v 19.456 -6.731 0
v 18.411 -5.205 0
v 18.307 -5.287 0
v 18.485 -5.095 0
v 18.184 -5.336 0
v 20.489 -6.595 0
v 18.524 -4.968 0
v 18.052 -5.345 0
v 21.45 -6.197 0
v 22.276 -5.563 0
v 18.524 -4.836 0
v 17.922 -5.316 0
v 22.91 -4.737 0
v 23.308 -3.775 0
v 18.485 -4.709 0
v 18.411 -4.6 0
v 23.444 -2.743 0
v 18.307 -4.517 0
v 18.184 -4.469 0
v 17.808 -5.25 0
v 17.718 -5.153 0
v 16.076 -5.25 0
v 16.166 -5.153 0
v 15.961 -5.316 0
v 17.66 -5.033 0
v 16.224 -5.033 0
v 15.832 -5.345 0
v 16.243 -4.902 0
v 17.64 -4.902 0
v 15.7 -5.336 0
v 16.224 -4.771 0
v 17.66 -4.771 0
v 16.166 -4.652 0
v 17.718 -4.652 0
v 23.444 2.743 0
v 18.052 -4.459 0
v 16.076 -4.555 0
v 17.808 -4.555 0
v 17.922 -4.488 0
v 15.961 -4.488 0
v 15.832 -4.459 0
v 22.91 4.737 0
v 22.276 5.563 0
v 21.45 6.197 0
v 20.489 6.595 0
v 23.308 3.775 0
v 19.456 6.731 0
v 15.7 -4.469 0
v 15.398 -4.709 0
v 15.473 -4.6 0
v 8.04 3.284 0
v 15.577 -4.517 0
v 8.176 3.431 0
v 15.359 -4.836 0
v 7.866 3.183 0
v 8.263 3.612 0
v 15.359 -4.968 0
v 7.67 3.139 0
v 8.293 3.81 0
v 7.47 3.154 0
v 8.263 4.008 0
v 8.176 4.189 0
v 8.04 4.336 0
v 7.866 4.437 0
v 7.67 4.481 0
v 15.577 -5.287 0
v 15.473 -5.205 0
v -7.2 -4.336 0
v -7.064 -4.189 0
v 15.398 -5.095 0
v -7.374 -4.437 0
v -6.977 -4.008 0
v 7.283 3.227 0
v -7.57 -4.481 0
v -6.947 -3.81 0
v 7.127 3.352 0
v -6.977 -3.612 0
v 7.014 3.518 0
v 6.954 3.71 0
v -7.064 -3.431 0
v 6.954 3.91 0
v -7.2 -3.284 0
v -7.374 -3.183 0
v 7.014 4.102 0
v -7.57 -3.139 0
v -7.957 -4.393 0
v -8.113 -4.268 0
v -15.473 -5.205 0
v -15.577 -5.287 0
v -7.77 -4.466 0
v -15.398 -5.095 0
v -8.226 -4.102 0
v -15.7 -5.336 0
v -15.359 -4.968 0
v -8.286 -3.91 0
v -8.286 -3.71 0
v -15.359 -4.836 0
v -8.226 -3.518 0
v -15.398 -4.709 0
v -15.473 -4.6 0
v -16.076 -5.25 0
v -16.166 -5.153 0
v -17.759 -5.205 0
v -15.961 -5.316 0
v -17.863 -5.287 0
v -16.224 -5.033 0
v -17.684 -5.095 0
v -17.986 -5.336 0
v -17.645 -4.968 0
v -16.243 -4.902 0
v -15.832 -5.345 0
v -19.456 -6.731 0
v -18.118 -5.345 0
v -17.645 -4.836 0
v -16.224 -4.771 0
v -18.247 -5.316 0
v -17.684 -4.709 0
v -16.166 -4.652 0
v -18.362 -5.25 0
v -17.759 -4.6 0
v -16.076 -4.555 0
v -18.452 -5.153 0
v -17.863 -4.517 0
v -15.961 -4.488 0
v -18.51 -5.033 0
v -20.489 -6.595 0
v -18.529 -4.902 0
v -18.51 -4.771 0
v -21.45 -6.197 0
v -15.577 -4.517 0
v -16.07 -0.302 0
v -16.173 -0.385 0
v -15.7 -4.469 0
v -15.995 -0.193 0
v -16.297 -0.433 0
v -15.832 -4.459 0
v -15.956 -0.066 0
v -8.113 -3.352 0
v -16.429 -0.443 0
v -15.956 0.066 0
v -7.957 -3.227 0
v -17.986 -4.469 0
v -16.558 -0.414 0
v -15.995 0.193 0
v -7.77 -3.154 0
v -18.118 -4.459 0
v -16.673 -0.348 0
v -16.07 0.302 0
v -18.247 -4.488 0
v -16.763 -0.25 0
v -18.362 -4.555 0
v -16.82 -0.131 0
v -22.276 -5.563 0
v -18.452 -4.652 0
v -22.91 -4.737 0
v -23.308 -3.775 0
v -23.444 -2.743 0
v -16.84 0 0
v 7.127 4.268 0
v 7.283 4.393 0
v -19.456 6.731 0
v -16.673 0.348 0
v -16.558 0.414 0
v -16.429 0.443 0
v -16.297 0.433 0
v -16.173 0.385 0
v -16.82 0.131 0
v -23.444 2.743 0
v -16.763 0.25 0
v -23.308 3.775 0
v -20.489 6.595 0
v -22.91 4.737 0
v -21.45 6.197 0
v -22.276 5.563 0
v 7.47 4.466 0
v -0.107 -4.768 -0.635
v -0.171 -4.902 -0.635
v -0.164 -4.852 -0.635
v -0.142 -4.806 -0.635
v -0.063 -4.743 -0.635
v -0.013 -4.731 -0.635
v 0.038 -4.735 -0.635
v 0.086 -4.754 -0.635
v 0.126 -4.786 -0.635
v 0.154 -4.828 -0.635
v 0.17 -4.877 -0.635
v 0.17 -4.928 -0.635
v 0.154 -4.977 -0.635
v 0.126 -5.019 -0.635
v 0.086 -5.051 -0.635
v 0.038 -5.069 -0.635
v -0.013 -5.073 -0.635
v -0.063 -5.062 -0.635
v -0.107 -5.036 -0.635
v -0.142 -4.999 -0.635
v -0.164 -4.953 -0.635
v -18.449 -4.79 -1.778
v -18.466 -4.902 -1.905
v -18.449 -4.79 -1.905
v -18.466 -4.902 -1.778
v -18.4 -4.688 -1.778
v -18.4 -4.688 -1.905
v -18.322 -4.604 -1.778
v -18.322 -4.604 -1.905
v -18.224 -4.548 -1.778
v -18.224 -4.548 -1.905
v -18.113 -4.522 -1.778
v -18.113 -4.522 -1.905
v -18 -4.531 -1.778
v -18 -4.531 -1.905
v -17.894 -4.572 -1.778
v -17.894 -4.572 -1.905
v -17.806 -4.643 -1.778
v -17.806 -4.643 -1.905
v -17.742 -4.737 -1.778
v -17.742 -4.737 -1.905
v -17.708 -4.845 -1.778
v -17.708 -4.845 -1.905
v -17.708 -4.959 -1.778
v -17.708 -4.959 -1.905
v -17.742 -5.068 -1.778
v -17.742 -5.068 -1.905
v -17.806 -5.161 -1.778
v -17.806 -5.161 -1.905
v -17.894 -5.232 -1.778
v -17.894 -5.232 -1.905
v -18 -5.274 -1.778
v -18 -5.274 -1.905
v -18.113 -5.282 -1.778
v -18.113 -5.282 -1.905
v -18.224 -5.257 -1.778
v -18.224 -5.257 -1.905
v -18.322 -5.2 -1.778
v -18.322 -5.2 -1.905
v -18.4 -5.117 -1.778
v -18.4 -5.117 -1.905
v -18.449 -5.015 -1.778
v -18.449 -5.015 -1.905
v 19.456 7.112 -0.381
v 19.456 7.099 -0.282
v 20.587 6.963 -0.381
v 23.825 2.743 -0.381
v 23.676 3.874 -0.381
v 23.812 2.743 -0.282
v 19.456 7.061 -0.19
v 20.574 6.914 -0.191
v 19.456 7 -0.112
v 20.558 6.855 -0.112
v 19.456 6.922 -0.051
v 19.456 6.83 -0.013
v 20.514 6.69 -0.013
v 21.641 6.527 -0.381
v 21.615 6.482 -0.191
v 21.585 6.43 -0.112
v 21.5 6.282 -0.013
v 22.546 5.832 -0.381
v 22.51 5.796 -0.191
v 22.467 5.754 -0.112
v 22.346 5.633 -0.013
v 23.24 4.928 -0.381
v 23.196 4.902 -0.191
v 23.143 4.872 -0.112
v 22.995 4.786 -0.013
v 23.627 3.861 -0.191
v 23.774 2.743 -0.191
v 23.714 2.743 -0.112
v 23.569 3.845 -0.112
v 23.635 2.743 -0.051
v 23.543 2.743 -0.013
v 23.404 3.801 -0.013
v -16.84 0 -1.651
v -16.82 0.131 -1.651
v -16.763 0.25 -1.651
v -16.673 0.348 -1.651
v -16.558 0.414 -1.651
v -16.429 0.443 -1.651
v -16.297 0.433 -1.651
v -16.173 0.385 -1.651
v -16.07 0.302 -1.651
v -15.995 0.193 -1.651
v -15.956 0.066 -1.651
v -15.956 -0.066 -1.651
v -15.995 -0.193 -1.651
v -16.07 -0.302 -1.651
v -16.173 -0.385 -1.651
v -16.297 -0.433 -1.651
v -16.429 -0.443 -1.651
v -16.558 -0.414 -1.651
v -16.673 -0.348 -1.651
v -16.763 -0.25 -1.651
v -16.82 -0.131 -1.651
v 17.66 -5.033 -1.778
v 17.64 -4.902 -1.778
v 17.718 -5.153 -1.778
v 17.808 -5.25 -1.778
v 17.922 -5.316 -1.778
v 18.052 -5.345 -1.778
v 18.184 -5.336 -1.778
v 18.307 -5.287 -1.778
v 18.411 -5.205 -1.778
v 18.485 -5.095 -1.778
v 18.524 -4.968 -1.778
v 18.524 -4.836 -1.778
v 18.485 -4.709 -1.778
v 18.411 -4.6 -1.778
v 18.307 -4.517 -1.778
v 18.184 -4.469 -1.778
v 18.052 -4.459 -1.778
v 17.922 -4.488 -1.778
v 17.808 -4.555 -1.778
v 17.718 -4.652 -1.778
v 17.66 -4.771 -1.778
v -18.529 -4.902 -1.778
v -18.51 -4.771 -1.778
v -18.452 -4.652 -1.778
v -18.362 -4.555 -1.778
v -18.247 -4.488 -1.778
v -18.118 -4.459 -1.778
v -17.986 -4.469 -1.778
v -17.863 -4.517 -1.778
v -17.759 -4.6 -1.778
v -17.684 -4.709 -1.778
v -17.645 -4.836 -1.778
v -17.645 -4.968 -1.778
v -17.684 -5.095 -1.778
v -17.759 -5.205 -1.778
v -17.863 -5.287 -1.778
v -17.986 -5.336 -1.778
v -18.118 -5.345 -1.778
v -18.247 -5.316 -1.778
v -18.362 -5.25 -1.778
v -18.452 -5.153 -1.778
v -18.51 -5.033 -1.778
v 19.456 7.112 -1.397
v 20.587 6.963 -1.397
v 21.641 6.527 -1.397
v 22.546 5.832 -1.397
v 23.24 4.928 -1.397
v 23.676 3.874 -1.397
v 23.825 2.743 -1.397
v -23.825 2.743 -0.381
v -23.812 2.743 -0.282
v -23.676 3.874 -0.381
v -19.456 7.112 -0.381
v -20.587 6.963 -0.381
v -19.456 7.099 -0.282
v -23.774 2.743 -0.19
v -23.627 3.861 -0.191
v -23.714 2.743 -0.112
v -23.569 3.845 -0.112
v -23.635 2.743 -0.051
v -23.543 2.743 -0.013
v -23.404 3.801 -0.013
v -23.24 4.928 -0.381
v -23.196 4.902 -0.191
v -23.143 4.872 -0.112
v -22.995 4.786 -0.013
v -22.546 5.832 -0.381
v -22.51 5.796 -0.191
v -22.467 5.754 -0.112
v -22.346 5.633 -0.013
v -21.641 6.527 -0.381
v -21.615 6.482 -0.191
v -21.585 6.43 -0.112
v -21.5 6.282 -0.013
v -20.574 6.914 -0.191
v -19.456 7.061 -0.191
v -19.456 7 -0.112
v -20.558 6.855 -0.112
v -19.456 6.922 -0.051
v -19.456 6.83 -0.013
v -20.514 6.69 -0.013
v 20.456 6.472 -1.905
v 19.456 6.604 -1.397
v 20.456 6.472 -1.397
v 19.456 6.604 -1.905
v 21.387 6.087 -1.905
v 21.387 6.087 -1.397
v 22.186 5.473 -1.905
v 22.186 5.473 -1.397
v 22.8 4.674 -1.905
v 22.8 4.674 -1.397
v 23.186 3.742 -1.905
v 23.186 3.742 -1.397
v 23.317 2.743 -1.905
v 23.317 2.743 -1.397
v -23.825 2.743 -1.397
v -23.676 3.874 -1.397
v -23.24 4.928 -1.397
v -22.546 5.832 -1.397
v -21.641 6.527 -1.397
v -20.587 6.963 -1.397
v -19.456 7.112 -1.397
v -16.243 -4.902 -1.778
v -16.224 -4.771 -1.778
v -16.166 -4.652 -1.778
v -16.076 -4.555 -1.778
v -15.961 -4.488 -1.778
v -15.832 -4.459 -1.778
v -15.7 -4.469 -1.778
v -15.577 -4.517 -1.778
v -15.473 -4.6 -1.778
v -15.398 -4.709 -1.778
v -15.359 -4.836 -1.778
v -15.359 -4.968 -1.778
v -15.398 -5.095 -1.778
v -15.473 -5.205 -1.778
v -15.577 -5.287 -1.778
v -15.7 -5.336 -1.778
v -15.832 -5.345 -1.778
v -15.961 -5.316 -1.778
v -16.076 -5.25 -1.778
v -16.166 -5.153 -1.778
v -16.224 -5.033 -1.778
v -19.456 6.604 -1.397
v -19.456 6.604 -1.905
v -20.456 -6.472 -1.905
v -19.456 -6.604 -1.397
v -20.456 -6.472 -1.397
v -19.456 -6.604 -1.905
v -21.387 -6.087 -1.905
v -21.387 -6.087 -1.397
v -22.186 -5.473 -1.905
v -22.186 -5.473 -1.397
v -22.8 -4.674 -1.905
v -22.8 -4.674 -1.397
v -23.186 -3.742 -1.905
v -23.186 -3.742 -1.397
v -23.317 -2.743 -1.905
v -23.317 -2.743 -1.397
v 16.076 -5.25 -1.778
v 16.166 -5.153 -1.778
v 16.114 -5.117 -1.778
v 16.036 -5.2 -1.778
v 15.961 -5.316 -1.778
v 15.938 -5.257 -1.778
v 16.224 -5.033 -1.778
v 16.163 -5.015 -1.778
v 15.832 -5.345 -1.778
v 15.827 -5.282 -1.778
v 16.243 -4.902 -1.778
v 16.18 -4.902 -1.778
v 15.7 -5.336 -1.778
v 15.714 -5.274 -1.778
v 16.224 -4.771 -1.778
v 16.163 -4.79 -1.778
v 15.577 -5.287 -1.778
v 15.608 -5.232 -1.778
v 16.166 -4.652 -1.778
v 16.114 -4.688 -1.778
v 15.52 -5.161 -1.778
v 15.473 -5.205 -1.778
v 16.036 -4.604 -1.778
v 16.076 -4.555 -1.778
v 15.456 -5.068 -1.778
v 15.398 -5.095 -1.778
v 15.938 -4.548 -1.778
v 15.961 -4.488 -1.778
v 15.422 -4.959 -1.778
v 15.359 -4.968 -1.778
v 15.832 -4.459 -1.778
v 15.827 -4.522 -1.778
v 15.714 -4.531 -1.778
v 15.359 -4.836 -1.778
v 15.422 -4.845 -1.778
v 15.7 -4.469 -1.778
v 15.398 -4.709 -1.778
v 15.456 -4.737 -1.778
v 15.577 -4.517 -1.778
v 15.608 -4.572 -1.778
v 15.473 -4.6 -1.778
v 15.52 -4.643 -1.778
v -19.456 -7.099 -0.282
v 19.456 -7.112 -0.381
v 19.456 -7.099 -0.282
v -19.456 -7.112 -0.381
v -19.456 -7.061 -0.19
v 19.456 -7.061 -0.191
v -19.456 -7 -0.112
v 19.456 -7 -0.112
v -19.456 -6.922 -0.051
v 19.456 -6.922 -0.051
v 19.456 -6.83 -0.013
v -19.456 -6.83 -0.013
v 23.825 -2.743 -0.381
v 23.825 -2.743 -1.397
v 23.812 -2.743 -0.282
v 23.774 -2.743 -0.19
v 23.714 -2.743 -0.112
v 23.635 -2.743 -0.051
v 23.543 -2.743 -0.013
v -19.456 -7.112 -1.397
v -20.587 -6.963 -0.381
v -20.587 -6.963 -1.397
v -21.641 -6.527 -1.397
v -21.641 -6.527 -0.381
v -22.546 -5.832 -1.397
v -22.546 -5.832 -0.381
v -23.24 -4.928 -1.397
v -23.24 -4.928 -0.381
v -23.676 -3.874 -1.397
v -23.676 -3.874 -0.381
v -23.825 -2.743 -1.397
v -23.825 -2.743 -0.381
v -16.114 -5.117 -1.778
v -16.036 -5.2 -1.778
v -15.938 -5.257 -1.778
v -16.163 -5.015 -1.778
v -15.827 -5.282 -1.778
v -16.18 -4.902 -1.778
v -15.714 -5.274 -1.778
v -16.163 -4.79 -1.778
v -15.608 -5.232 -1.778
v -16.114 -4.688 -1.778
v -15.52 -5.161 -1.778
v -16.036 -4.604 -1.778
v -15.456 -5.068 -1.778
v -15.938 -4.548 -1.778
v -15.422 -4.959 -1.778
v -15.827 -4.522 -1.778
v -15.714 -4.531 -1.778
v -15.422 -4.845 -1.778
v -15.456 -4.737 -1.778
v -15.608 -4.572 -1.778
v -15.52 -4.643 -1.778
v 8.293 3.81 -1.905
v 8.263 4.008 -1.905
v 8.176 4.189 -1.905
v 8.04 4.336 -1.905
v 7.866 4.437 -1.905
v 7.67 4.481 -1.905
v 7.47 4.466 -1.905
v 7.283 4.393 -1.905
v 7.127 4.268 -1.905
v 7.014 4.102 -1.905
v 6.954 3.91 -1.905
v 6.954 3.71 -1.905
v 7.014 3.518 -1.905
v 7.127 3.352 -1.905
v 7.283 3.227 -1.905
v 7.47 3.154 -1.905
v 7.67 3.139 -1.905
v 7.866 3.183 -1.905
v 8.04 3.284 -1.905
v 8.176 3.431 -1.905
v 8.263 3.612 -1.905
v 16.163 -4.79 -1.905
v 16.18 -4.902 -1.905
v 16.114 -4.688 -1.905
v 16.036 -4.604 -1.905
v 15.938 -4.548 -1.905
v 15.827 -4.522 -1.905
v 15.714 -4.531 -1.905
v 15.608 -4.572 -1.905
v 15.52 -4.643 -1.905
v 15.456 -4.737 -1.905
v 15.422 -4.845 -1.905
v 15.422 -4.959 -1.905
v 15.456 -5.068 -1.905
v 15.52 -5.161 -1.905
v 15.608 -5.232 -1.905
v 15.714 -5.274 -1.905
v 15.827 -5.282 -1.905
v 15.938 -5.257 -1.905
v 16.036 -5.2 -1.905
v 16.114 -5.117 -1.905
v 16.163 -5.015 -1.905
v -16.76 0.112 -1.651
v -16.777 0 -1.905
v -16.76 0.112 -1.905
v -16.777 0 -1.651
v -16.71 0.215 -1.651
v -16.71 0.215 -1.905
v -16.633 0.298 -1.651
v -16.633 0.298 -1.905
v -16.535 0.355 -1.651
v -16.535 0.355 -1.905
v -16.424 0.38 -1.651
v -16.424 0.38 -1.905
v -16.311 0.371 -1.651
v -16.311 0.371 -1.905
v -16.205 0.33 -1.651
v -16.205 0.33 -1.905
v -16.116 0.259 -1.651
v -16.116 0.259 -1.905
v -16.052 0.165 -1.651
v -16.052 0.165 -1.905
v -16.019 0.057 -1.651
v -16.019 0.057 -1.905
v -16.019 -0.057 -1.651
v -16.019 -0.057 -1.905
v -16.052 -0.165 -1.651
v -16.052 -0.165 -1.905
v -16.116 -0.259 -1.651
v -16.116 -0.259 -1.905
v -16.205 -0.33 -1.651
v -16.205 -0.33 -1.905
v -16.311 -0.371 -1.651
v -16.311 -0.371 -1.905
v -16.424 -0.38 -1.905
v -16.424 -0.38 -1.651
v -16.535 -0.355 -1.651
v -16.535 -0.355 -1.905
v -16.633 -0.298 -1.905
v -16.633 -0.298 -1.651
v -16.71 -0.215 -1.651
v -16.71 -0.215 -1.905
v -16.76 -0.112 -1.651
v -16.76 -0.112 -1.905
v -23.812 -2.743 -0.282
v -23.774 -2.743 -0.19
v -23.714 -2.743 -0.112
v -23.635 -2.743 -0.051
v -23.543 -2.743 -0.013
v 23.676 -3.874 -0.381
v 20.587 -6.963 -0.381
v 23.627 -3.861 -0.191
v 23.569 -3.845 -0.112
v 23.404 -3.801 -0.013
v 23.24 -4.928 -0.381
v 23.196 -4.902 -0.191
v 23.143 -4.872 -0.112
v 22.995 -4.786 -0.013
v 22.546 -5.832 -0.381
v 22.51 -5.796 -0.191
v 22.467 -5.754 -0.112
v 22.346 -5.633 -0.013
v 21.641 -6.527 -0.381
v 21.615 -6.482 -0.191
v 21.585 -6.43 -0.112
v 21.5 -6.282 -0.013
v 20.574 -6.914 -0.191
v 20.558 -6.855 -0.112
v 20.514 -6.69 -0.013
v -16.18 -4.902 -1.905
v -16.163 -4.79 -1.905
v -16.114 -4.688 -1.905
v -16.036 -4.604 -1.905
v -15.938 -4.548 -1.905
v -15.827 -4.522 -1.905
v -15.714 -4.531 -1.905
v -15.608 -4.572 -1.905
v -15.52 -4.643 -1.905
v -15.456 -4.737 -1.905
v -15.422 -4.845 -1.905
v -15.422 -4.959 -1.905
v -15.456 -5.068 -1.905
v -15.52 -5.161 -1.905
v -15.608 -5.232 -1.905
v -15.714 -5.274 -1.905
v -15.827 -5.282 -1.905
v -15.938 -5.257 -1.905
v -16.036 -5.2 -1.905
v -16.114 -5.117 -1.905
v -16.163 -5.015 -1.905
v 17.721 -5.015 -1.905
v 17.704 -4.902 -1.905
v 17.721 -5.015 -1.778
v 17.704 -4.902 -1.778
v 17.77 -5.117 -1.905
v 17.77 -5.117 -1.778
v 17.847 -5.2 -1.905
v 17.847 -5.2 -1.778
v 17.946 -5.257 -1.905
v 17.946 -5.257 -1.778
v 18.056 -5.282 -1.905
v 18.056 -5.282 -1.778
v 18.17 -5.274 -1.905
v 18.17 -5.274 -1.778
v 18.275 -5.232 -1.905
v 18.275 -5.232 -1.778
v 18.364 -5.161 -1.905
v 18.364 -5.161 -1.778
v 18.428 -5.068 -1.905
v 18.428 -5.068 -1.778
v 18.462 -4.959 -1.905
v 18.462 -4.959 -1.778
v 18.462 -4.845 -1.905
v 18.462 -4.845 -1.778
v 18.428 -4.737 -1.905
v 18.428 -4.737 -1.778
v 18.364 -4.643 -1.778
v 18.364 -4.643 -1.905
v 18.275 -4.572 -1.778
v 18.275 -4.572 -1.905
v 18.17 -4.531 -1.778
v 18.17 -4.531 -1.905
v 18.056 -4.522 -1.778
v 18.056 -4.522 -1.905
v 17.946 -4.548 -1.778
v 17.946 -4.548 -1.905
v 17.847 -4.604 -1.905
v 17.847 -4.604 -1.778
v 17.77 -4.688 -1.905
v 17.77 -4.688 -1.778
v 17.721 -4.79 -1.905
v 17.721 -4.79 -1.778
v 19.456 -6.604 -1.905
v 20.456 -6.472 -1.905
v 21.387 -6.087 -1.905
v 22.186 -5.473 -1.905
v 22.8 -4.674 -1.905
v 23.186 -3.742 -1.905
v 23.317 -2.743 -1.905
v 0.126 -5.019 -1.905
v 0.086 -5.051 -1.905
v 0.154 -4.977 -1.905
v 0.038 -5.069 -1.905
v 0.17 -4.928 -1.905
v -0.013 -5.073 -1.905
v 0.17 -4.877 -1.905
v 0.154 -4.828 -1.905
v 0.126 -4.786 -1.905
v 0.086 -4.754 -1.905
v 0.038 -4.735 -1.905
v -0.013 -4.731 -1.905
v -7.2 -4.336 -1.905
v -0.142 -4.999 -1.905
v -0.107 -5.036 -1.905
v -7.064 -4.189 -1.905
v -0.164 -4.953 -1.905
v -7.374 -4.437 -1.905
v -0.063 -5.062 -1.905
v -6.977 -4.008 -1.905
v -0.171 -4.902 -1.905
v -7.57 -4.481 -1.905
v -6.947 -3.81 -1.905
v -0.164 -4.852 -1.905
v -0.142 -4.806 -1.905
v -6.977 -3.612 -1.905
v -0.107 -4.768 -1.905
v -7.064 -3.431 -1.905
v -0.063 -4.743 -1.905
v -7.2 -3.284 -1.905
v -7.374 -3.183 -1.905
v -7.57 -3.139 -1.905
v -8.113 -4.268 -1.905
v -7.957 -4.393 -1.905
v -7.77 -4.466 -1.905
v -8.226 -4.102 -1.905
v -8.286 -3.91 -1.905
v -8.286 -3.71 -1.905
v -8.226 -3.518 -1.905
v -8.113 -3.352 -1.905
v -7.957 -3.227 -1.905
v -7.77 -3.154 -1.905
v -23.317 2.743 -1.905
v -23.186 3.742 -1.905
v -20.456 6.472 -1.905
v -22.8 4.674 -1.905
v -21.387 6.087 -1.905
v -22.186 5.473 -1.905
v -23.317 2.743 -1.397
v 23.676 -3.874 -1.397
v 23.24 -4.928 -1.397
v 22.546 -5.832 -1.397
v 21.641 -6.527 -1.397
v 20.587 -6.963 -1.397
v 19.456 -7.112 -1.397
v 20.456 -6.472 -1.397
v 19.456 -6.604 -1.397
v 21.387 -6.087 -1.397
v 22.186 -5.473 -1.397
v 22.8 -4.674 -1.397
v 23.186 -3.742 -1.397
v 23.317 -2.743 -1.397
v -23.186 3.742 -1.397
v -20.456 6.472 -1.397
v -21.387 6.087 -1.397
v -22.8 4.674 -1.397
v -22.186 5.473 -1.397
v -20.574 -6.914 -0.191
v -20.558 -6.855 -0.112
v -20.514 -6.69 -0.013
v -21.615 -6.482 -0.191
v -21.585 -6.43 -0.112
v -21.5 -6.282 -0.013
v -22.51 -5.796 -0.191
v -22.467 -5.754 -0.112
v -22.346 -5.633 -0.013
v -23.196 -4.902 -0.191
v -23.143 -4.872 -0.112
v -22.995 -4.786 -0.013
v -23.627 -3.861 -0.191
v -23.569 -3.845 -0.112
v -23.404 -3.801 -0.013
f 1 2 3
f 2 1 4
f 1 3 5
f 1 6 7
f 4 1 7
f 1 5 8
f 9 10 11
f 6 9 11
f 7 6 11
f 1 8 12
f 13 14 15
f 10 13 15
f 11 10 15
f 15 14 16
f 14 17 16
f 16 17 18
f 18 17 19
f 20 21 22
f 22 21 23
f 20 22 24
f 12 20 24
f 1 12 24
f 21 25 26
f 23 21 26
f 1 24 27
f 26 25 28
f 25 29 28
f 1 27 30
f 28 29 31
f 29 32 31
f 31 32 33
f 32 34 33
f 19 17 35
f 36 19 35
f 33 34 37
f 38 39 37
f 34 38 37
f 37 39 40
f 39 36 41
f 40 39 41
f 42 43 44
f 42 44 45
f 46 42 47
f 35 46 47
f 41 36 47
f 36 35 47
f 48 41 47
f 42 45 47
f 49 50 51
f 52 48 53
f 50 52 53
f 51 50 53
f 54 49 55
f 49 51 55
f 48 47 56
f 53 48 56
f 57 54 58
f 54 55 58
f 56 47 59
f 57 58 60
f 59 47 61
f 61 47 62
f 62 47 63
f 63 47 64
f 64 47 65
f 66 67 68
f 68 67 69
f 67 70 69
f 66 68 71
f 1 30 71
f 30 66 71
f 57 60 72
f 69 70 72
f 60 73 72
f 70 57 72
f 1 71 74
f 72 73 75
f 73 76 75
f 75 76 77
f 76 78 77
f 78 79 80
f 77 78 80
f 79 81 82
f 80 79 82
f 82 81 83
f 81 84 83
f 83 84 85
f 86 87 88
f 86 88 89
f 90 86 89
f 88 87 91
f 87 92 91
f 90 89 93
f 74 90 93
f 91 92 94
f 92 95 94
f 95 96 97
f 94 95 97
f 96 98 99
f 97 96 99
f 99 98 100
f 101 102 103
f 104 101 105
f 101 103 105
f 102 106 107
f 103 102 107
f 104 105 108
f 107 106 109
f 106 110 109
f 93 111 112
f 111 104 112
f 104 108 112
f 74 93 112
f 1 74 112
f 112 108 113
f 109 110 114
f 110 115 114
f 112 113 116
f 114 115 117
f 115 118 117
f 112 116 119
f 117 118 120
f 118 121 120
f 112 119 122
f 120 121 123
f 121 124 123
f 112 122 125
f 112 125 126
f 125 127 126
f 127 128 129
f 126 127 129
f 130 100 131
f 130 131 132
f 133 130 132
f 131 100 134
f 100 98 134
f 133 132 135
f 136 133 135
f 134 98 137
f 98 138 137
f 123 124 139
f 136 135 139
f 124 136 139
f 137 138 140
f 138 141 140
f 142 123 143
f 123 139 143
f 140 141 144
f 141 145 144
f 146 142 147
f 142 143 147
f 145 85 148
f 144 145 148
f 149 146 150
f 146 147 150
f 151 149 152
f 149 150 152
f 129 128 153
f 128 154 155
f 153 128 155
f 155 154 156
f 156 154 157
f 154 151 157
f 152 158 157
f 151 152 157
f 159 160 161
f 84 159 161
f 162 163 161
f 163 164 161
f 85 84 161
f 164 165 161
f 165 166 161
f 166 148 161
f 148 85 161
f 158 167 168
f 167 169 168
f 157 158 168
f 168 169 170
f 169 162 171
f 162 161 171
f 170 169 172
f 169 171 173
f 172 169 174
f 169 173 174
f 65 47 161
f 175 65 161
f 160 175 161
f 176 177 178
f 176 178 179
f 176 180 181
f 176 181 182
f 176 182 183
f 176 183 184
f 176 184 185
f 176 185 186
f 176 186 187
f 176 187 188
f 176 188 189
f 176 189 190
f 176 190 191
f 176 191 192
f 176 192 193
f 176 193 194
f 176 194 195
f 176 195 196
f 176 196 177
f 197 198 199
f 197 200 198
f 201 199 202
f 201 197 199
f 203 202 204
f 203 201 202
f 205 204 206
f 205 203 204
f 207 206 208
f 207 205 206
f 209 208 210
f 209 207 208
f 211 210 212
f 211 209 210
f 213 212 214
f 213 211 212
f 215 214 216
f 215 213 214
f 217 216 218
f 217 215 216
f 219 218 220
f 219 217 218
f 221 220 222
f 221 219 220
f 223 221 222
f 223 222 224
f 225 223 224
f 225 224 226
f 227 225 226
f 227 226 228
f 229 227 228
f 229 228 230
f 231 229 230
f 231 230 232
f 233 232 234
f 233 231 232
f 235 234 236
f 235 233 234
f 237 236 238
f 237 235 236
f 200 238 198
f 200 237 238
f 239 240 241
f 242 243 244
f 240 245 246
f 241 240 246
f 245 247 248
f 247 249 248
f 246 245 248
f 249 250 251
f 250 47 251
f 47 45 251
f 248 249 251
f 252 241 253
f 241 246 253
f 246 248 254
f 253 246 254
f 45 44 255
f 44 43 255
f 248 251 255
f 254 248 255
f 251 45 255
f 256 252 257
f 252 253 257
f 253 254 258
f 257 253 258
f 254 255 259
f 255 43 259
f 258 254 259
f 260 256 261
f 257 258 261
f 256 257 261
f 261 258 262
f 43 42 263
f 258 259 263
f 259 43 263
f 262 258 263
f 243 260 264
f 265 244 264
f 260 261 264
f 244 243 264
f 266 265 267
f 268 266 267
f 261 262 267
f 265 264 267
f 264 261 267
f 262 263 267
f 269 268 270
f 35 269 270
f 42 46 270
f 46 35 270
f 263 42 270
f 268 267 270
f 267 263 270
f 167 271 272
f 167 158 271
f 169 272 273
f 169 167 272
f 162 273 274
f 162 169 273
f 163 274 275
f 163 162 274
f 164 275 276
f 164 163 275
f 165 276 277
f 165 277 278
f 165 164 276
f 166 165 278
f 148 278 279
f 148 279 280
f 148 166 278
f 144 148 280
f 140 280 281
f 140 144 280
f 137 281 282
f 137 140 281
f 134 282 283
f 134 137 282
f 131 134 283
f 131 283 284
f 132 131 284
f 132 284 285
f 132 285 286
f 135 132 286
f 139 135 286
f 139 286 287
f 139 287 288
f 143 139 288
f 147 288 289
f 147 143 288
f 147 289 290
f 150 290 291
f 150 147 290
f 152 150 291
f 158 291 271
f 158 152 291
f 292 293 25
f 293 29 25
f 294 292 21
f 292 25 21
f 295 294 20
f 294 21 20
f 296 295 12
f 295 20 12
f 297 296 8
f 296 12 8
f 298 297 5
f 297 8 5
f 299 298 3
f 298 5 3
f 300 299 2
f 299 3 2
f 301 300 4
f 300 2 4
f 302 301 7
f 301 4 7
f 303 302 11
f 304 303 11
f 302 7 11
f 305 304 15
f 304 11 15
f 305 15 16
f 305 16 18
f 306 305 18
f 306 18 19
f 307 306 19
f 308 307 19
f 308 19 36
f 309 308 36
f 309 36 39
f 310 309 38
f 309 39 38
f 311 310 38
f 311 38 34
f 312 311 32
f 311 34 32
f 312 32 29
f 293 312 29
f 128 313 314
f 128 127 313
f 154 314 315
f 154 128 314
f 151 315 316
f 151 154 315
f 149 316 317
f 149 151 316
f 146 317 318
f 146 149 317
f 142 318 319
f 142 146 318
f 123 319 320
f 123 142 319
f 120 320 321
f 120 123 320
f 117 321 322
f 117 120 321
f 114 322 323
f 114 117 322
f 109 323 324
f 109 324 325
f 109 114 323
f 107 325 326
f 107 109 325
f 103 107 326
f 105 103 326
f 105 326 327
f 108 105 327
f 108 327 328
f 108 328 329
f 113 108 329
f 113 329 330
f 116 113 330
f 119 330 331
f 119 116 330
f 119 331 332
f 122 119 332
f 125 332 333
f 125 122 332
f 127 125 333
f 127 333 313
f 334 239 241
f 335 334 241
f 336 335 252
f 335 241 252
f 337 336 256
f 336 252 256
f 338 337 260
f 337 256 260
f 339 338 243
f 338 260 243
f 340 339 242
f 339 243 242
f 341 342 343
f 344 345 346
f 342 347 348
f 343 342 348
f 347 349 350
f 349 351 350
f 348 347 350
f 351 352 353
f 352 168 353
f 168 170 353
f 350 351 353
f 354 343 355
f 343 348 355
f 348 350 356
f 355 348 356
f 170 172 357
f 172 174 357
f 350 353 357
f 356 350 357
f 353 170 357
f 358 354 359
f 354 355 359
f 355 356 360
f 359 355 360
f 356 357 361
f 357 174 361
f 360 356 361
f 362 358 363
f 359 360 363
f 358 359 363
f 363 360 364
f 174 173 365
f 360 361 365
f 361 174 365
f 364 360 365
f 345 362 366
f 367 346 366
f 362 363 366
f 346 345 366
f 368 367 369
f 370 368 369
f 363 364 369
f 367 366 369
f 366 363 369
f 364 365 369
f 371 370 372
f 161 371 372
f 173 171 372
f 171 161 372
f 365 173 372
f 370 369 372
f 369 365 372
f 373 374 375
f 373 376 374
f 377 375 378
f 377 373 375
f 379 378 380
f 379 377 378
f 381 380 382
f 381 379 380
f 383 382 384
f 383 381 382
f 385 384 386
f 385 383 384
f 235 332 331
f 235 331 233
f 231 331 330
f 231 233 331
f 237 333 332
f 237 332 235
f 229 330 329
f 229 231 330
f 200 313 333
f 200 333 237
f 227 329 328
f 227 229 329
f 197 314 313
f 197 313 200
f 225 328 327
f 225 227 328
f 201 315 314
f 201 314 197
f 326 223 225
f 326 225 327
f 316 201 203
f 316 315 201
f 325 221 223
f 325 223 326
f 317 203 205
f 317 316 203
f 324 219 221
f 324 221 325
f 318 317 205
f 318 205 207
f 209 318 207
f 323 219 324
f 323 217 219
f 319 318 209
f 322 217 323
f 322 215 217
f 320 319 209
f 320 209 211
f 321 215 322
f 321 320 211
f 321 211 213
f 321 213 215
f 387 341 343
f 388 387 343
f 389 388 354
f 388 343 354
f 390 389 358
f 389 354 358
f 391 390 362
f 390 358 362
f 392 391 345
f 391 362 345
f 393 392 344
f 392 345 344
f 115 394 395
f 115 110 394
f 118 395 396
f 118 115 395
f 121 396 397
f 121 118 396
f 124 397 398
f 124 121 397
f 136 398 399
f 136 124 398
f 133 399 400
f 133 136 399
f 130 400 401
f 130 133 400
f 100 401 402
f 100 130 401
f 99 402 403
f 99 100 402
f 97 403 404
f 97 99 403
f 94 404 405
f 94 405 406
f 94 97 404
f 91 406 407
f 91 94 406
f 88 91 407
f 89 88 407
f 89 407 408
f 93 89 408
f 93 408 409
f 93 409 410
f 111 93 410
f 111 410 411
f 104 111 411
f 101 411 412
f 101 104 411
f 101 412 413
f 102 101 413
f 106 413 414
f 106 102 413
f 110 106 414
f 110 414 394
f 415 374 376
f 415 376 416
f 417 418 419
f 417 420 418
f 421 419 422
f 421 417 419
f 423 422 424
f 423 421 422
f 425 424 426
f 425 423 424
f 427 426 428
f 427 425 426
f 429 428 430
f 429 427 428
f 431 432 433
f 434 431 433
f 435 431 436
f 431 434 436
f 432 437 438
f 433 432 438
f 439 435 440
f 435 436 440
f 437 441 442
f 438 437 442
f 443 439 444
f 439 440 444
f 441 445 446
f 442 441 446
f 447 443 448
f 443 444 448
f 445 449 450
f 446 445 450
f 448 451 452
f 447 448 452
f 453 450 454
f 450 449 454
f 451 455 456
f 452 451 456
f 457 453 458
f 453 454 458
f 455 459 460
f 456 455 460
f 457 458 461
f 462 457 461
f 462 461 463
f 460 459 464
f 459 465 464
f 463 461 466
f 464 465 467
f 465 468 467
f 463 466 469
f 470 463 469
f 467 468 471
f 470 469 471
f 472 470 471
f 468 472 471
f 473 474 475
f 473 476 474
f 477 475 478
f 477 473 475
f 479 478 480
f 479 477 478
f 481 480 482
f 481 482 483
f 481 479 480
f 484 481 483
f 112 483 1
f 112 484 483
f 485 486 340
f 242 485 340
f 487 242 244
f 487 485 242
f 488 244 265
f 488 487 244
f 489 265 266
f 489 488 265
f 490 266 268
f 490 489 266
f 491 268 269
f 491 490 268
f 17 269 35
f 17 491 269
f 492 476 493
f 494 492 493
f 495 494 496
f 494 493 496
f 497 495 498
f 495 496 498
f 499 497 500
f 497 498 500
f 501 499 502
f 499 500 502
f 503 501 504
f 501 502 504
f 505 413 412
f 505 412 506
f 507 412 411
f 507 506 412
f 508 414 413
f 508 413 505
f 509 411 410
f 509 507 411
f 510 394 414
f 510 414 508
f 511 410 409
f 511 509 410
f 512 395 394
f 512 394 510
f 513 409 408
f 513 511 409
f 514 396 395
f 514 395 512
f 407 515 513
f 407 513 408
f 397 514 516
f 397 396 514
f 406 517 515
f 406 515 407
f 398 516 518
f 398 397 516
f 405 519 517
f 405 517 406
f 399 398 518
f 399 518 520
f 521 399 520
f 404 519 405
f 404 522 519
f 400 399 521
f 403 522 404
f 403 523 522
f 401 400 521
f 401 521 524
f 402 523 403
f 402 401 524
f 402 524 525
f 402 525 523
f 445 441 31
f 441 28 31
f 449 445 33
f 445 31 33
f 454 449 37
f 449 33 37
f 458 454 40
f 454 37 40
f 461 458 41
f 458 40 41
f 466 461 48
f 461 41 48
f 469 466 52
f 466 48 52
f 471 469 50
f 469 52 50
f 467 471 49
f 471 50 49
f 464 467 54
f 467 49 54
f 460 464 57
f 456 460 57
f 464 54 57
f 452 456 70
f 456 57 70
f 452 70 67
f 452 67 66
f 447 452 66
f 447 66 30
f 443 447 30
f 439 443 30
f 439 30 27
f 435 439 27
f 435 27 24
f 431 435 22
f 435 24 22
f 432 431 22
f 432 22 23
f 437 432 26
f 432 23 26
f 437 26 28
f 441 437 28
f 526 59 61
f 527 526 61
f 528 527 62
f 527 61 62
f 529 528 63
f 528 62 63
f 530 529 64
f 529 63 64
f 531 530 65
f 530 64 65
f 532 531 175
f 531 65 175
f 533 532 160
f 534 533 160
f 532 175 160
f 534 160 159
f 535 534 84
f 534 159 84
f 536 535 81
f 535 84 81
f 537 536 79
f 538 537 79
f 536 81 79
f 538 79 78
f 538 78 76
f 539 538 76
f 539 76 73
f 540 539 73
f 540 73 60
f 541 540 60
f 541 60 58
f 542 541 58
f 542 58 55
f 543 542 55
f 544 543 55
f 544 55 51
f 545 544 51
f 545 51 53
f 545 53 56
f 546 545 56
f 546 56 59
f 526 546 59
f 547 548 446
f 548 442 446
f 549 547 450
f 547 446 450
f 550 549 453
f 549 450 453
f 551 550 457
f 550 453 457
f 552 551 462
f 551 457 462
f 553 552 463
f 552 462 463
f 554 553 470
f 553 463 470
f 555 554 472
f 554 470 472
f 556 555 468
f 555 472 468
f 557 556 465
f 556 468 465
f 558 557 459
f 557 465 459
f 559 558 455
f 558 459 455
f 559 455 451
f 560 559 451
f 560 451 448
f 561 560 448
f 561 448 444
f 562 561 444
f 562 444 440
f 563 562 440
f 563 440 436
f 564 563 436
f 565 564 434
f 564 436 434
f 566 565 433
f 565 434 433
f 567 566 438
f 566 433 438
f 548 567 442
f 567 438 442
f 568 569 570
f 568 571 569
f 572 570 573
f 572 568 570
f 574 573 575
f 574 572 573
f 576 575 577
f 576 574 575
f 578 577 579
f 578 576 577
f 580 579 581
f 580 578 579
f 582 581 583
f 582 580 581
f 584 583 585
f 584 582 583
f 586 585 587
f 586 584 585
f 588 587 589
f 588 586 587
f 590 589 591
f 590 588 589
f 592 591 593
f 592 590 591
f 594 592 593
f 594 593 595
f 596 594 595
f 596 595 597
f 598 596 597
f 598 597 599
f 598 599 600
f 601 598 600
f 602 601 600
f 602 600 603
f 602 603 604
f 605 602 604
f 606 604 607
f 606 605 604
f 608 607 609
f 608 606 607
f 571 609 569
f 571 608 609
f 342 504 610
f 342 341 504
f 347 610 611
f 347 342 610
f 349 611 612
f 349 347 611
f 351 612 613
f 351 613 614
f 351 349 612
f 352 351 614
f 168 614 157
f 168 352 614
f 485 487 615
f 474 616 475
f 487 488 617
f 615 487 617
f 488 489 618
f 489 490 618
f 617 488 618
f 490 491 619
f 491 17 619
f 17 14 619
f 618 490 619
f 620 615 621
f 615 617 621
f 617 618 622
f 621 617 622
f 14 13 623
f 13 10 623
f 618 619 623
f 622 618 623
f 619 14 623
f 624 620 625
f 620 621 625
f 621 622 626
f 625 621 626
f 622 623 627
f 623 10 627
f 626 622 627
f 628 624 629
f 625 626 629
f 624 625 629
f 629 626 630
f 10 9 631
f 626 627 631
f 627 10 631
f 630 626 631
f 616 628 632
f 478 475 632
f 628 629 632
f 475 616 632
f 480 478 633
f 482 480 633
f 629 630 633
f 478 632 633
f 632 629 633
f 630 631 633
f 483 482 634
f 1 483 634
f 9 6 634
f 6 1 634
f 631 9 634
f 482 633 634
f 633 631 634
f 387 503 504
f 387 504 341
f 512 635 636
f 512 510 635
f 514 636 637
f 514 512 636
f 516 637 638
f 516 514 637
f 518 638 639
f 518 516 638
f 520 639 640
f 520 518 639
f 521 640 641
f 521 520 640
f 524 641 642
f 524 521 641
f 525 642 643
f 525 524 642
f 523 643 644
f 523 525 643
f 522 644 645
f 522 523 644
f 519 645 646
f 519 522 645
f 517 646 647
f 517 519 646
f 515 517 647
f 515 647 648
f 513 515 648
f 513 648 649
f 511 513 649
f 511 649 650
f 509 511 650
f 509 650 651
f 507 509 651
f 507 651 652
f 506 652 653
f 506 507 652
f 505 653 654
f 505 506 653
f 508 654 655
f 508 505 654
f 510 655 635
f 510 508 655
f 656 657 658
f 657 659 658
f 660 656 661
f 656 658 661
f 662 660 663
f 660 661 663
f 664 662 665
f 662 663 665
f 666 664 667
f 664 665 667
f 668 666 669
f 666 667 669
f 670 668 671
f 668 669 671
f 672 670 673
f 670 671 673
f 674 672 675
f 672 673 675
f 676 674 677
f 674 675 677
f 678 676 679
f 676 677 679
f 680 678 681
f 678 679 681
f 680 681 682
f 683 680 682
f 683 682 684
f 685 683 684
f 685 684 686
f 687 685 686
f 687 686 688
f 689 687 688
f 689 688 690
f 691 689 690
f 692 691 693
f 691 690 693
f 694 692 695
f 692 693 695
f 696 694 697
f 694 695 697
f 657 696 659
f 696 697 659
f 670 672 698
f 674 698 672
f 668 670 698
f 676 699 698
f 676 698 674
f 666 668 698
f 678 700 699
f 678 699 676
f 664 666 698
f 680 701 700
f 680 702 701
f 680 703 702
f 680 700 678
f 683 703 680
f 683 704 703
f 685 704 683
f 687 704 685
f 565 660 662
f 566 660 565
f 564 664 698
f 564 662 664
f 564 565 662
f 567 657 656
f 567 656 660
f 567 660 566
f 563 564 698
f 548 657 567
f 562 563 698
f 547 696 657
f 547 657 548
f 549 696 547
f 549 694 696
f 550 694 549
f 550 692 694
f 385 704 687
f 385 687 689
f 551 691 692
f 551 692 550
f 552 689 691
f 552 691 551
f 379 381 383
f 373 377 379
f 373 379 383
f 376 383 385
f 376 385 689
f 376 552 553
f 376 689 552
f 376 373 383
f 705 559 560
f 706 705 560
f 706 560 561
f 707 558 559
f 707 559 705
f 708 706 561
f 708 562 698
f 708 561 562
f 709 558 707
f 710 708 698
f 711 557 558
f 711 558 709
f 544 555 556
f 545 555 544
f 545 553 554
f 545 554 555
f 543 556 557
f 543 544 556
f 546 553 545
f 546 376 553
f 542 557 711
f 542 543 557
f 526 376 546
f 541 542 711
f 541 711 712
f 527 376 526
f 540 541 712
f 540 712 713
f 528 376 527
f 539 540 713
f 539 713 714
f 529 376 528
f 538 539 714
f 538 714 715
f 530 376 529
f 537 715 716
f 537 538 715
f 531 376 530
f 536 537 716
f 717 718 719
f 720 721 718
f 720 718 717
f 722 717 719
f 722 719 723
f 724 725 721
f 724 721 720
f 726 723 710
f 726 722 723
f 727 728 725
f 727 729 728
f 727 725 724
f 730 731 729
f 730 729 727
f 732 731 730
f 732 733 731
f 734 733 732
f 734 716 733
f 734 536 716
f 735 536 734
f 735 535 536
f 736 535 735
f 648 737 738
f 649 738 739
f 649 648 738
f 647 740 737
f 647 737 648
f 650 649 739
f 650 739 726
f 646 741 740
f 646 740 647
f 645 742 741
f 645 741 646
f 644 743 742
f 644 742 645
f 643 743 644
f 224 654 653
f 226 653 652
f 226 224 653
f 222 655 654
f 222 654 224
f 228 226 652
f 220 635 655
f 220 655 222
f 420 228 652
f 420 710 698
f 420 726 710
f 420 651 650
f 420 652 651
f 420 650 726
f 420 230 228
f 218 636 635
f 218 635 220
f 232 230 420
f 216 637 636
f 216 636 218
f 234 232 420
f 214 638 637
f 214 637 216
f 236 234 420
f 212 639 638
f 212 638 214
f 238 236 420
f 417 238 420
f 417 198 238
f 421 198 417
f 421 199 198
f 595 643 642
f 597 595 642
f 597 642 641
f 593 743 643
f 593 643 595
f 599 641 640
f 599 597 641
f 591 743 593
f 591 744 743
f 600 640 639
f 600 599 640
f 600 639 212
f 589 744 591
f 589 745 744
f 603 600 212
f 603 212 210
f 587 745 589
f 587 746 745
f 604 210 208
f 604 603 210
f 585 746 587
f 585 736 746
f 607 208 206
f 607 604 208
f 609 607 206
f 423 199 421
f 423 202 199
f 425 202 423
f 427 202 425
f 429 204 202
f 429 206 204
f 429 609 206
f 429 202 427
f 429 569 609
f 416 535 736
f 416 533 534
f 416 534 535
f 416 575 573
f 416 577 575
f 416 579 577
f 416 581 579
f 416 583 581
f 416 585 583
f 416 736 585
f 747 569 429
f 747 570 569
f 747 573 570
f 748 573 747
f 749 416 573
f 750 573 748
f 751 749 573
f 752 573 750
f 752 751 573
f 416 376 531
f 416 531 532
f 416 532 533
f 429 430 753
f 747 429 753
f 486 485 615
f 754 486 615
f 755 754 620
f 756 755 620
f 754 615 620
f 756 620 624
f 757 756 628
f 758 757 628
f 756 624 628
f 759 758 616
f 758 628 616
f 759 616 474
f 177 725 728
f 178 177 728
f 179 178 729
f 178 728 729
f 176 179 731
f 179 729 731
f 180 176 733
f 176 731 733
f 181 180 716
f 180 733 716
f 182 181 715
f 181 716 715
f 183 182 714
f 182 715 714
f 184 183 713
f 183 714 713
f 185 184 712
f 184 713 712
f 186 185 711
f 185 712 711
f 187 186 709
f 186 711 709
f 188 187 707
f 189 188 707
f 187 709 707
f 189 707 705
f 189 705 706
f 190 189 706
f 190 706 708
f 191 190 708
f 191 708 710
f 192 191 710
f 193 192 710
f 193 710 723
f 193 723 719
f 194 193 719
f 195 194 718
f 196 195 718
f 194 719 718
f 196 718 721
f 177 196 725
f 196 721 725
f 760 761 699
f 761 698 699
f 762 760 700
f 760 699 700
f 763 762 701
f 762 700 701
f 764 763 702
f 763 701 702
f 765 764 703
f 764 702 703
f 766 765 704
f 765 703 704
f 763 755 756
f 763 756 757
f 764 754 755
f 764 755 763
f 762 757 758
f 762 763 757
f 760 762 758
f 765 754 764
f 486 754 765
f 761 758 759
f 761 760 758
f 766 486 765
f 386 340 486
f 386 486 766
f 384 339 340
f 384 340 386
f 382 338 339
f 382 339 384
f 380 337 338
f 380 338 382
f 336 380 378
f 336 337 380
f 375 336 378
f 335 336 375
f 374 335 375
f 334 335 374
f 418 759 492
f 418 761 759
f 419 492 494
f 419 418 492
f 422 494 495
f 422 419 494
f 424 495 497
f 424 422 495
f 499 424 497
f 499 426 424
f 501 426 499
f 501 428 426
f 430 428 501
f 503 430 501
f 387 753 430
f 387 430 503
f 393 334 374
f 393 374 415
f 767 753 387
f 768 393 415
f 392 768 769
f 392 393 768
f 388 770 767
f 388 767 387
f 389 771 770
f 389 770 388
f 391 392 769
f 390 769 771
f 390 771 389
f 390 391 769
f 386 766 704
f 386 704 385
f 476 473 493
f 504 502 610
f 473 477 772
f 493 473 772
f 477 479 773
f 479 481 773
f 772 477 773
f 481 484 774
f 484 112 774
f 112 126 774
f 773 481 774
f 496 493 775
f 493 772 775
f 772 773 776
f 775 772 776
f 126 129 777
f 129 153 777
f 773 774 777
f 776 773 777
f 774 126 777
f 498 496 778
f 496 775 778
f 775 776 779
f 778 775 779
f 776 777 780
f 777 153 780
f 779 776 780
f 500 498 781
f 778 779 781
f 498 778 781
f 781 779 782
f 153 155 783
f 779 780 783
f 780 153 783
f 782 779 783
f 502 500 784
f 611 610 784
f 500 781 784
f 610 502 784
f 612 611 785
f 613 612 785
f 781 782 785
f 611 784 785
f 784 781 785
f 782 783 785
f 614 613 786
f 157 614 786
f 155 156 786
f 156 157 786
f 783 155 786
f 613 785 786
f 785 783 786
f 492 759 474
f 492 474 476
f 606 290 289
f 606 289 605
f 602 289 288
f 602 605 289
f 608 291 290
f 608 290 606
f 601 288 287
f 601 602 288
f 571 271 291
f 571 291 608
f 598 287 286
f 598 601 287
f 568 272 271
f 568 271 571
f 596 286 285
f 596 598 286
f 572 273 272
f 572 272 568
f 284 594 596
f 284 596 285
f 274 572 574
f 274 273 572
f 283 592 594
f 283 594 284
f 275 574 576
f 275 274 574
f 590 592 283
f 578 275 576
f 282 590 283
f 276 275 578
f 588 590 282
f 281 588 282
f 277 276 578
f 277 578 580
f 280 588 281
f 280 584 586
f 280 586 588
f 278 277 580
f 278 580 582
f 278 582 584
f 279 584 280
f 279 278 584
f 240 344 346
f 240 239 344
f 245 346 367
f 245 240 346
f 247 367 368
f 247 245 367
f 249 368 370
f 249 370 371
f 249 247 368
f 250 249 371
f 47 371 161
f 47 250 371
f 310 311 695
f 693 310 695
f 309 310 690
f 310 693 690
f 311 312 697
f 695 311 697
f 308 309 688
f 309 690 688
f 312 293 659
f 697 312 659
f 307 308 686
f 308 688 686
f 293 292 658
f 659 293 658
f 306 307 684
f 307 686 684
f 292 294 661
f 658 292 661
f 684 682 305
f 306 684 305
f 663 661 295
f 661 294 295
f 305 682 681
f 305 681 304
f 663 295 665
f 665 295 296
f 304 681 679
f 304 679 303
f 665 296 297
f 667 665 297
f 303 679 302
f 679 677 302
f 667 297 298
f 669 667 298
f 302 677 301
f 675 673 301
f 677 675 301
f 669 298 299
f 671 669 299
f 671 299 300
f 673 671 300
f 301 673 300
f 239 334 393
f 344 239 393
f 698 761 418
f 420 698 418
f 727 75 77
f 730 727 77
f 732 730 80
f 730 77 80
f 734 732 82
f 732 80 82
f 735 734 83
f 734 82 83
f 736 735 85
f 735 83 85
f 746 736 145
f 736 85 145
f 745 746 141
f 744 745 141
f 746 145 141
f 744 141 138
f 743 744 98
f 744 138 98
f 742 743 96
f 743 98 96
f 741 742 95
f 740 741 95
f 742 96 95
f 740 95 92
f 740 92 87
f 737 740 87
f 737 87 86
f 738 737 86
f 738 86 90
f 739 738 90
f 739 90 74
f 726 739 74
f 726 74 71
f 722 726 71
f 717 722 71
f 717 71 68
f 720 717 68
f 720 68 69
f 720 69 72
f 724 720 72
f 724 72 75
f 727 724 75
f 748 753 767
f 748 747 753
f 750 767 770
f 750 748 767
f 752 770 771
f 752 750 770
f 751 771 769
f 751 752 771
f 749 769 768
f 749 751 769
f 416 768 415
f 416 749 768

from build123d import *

# Parameters (mm, degrees)
SKETCH1_W           = 47.6504
SKETCH1_H           = 14.224
BOSS_EXTRUDE1_DEPTH = 1.397
SKETCH2_W           = 46.6344
SKETCH2_H           = 13.208
BOSS_EXTRUDE2_DEPTH = 0.508
FILLET1_R           = 3.8608
FILLET2_R           = 3.8608
FILLET3_R           = 3.8608
FILLET4_R           = 3.8608
FILLET5_R           = 4.3688
FILLET6_R           = 4.3688
FILLET7_R           = 4.3688
FILLET8_R           = 4.3688
FILLET9_R           = 0.381
LPATTERN1_COUNT     = 2
LPATTERN1_PITCH     = 2.286
SKETCH7_R           = 0.6731
CUT_EXTRUDE1_DEPTH  = 25.936914886
SKETCH8_R           = 0.17145
CUT_EXTRUDE2_DEPTH  = 1.27


with BuildPart() as part:
    # Sketch1 → Boss-Extrude1 (new body)
    with BuildSketch(Plane(origin=(0, 0, -1.397), x_dir=(-1, 0, 0), z_dir=(0, 0, -1))):
        Rectangle(SKETCH1_W, SKETCH1_H)
    extrude(amount=-BOSS_EXTRUDE1_DEPTH)

    # Sketch2 → Boss-Extrude2 (add)
    with BuildSketch(Plane(origin=(0, 0, -1.397), x_dir=(-1, 0, 0), z_dir=(0, 0, -1))):
        Rectangle(SKETCH2_W, SKETCH2_H)
    extrude(amount=BOSS_EXTRUDE2_DEPTH)

    # Sketch3 → Cut-Revolve1 (revolve, cut)
    with BuildSketch(Plane.XZ, mode=Mode.PRIVATE) as cut_revolve1_sk:
        Polygon((-15.9512, 0), (-16.3957, 0), (-16.3957, -1.905), (-16.0147, -1.905), (-16.0147, -1.651), (-15.9512, -1.651), align=None)
    revolve(cut_revolve1_sk.sketch.rotate(Axis((-16.3957, 0, 0), (0, 0, -1)), 180), axis=Axis((-16.3957, 0, 0), (0, 0, -1)), mode=Mode.SUBTRACT)

    # Sketch6 → Cut-Revolve4 (revolve, cut)
    with BuildSketch(Plane.XZ.offset(4.9022), mode=Mode.PRIVATE) as cut_revolve4_sk:
        Polygon((-15.3543, 0), (-15.7988, 0), (-15.7988, -1.905), (-15.4178, -1.905), (-15.4178, -1.778), (-15.3543, -1.778), align=None)
    cut_revolve4 = revolve(cut_revolve4_sk.sketch.rotate(Axis((-15.7988, -4.9022, 0), (0, 0, -1)), 180), axis=Axis((-15.7988, -4.9022, 0), (0, 0, -1)), mode=Mode.SUBTRACT)

    # Fillet1
    fillet1_edges = [part.edges().sort_by_distance(p)[0] for p in [
        (23.3172, -6.604, -1.651),
    ]]
    fillet(fillet1_edges, radius=FILLET1_R)

    # Fillet2
    fillet2_edges = [part.edges().sort_by_distance(p)[0] for p in [
        (-23.3172, -6.604, -1.651),
    ]]
    fillet(fillet2_edges, radius=FILLET2_R)

    # Fillet3
    fillet3_edges = [part.edges().sort_by_distance(p)[0] for p in [
        (-23.3172, 6.604, -1.651),
    ]]
    fillet(fillet3_edges, radius=FILLET3_R)

    # Fillet4
    fillet4_edges = [part.edges().sort_by_distance(p)[0] for p in [
        (23.3172, 6.604, -1.651),
    ]]
    fillet(fillet4_edges, radius=FILLET4_R)

    # Fillet5
    fillet5_edges = [part.edges().sort_by_distance(p)[0] for p in [
        (-23.8252, -7.112, -0.6985),
    ]]
    fillet(fillet5_edges, radius=FILLET5_R)

    # Fillet6
    fillet6_edges = [part.edges().sort_by_distance(p)[0] for p in [
        (-23.8252, 7.112, -0.6985),
    ]]
    fillet(fillet6_edges, radius=FILLET6_R)

    # Fillet7
    fillet7_edges = [part.edges().sort_by_distance(p)[0] for p in [
        (23.8252, 7.112, -0.6985),
    ]]
    fillet(fillet7_edges, radius=FILLET7_R)

    # Fillet8
    fillet8_edges = [part.edges().sort_by_distance(p)[0] for p in [
        (23.8252, -7.112, -0.6985),
    ]]
    fillet(fillet8_edges, radius=FILLET8_R)

    # Fillet9
    fillet9_edges = [part.edges().sort_by_distance(p)[0] for p in [
        (-23.8252, 0, 0),
        (-22.545608106, -5.832408106, 0),
        (0, 7.112, 0),
        (-22.545608106, 5.832408106, 0),
        (23.8252, 0, 0),
        (22.545608106, 5.832408106, 0),
        (0, -7.112, 0),
        (22.545608106, -5.832408106, 0),
    ]]
    fillet(fillet9_edges, radius=FILLET9_R)

    # LPattern1: Cut-Revolve4 ×2
    with Locations(*[(-i * LPATTERN1_PITCH, 0, 0) for i in range(1, LPATTERN1_COUNT)]):
        add(cut_revolve4, mode=Mode.SUBTRACT)

    # Mirror1: Cut-Revolve4 across plane
    add(cut_revolve4.mirror(Plane(origin=(0, 0, 0), x_dir=(0, 0, 1), z_dir=(1, 0, 0))), mode=Mode.SUBTRACT)

    # Mirror1 copy 1 sketch → Mirror1 copy 1 (revolve, cut)
    with BuildSketch(Plane(origin=(2.286, -4.9022, 0), x_dir=(-1, 0, 0), z_dir=(0, -1, 0))):
        Polygon((-15.3543, 0), (-15.7988, 0), (-15.7988, 1.905), (-15.4178, 1.905), (-15.4178, 1.778), (-15.3543, 1.778), align=None)
    revolve(axis=Axis((18.0848, -4.9022, 0), (0, 0, 1)), mode=Mode.SUBTRACT)

    # Sketch7 → Cut-Extrude1 (cut, through all)
    with BuildSketch(Plane.XY):
        with Locations((-7.62, -3.81)):
            Circle(SKETCH7_R)
        with Locations((7.62, 3.81)):
            Circle(SKETCH7_R)
    extrude(amount=-CUT_EXTRUDE1_DEPTH, mode=Mode.SUBTRACT)

    # Sketch8 → Cut-Extrude2 (cut)
    with BuildSketch(Plane(origin=(0, 0, -1.905), x_dir=(-1, 0, 0), z_dir=(0, 0, -1))):
        with Locations((0, -4.9022)):
            Circle(SKETCH8_R)
    extrude(amount=-CUT_EXTRUDE2_DEPTH, mode=Mode.SUBTRACT)


solid = part.part
